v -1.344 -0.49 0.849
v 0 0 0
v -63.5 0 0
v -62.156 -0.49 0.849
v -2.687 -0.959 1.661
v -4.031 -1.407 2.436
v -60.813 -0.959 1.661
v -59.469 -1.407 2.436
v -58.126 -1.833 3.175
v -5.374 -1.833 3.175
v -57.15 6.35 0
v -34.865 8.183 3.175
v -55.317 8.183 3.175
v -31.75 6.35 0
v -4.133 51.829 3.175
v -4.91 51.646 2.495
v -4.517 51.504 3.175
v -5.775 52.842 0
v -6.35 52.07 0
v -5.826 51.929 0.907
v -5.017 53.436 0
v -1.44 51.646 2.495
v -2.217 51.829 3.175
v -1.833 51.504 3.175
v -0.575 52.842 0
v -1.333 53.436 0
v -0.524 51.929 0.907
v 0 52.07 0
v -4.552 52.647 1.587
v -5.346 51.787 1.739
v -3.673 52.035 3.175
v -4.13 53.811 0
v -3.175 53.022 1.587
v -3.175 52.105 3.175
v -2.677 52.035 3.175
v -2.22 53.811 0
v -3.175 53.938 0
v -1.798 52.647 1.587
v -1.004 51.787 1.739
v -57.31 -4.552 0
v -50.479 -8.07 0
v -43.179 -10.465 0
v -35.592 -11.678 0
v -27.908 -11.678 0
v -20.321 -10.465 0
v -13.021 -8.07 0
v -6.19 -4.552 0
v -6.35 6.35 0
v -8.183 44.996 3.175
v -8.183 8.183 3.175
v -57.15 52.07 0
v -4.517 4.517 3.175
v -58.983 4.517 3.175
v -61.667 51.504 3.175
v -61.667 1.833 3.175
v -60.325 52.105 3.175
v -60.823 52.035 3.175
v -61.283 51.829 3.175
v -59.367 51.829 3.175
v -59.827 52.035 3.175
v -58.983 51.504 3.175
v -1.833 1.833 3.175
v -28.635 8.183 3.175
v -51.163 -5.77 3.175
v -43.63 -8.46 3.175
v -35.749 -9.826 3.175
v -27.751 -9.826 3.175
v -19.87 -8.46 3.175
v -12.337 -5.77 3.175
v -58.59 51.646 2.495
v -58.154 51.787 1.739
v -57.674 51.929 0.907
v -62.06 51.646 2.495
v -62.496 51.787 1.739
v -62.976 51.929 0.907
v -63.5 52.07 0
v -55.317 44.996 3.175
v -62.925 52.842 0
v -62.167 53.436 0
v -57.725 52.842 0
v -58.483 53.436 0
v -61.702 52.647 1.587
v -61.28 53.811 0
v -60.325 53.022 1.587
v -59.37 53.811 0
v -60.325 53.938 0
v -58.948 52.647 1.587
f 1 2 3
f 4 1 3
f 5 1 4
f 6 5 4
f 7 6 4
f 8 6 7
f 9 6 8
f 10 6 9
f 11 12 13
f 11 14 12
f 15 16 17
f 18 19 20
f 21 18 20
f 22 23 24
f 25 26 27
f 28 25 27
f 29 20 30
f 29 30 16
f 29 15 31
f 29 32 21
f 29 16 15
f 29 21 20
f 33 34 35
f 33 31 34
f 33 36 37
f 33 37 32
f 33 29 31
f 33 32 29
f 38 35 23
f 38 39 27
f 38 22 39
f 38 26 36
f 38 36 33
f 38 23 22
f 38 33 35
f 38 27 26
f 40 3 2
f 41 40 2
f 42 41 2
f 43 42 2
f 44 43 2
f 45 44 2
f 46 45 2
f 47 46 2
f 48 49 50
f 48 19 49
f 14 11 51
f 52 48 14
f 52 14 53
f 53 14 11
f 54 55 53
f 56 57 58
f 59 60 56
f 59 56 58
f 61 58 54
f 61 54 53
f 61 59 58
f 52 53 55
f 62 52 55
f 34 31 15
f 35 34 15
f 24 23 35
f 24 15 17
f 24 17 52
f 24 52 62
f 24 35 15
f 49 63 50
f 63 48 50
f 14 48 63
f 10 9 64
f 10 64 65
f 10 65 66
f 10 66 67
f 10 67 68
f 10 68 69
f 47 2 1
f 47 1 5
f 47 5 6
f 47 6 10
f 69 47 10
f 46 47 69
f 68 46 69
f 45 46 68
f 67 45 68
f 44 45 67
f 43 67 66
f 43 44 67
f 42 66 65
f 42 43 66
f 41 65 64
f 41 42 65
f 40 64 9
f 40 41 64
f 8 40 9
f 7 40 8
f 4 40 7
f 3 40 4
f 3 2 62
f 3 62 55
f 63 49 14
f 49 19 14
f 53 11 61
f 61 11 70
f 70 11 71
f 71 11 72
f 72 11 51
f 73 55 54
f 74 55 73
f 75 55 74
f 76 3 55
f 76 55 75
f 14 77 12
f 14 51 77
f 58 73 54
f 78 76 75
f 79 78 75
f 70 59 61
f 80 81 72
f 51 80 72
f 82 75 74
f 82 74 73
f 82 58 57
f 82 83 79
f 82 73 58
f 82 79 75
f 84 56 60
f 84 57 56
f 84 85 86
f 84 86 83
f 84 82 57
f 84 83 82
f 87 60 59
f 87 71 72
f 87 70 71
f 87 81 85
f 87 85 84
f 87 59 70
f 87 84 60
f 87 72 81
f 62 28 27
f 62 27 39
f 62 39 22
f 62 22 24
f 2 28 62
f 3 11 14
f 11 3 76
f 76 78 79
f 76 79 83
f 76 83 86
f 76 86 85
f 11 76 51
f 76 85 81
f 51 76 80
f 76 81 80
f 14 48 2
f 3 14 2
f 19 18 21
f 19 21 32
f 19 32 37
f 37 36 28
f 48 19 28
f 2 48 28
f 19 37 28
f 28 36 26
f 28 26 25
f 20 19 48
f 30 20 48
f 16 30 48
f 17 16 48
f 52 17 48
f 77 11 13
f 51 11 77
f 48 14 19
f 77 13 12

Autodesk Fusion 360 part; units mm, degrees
sketch "Sketch1" plane through (0, 0, 0) normal (0, 0, 1) x (1, 0, 0)
  line L0 (0, 0) -> (-63.5, 0)
  line L1 (-63.5, 0) -> (-63.5, 63.5)
  line L2 (-63.5, 63.5) -> (0, 63.5)
  line L3 (0, 63.5) -> (0, 0)
  line L4 (-6.35, 6.35) -> (-57.15, 6.35)
  line L5 (-57.15, 6.35) -> (-57.15, 57.15)
  line L6 (-57.15, 57.15) -> (-6.35, 57.15)
  line L7 (-6.35, 57.15) -> (-6.35, 6.35)
  line L8 (-63.5, 63.5) -> (-31.75, 6.35)
  line L9 (0, 63.5) -> (-31.75, 6.35)
  arc A0 (-63.5, 0) -> (0, 0) centre (-31.75, 36.6899) ccw
  arc A1 (-57.15, 52.07) -> (-63.5, 52.07) centre (-60.325, 50.3061) ccw
  arc A2 (0, 52.07) -> (-6.35, 52.07) centre (-3.175, 50.3061) ccw
  dimension "d1" = 63.5
  dimension "d2" = 63.5
  dimension "d3" = 6.35
extrude "Extrude1" add sketch "Sketch1" along normal blind 3.175 draft -30 contours L0 A0 | L0 L1 L3 L4 L5 L7 A1 A2 | L4 L7 L9 | L4 L5 L8
